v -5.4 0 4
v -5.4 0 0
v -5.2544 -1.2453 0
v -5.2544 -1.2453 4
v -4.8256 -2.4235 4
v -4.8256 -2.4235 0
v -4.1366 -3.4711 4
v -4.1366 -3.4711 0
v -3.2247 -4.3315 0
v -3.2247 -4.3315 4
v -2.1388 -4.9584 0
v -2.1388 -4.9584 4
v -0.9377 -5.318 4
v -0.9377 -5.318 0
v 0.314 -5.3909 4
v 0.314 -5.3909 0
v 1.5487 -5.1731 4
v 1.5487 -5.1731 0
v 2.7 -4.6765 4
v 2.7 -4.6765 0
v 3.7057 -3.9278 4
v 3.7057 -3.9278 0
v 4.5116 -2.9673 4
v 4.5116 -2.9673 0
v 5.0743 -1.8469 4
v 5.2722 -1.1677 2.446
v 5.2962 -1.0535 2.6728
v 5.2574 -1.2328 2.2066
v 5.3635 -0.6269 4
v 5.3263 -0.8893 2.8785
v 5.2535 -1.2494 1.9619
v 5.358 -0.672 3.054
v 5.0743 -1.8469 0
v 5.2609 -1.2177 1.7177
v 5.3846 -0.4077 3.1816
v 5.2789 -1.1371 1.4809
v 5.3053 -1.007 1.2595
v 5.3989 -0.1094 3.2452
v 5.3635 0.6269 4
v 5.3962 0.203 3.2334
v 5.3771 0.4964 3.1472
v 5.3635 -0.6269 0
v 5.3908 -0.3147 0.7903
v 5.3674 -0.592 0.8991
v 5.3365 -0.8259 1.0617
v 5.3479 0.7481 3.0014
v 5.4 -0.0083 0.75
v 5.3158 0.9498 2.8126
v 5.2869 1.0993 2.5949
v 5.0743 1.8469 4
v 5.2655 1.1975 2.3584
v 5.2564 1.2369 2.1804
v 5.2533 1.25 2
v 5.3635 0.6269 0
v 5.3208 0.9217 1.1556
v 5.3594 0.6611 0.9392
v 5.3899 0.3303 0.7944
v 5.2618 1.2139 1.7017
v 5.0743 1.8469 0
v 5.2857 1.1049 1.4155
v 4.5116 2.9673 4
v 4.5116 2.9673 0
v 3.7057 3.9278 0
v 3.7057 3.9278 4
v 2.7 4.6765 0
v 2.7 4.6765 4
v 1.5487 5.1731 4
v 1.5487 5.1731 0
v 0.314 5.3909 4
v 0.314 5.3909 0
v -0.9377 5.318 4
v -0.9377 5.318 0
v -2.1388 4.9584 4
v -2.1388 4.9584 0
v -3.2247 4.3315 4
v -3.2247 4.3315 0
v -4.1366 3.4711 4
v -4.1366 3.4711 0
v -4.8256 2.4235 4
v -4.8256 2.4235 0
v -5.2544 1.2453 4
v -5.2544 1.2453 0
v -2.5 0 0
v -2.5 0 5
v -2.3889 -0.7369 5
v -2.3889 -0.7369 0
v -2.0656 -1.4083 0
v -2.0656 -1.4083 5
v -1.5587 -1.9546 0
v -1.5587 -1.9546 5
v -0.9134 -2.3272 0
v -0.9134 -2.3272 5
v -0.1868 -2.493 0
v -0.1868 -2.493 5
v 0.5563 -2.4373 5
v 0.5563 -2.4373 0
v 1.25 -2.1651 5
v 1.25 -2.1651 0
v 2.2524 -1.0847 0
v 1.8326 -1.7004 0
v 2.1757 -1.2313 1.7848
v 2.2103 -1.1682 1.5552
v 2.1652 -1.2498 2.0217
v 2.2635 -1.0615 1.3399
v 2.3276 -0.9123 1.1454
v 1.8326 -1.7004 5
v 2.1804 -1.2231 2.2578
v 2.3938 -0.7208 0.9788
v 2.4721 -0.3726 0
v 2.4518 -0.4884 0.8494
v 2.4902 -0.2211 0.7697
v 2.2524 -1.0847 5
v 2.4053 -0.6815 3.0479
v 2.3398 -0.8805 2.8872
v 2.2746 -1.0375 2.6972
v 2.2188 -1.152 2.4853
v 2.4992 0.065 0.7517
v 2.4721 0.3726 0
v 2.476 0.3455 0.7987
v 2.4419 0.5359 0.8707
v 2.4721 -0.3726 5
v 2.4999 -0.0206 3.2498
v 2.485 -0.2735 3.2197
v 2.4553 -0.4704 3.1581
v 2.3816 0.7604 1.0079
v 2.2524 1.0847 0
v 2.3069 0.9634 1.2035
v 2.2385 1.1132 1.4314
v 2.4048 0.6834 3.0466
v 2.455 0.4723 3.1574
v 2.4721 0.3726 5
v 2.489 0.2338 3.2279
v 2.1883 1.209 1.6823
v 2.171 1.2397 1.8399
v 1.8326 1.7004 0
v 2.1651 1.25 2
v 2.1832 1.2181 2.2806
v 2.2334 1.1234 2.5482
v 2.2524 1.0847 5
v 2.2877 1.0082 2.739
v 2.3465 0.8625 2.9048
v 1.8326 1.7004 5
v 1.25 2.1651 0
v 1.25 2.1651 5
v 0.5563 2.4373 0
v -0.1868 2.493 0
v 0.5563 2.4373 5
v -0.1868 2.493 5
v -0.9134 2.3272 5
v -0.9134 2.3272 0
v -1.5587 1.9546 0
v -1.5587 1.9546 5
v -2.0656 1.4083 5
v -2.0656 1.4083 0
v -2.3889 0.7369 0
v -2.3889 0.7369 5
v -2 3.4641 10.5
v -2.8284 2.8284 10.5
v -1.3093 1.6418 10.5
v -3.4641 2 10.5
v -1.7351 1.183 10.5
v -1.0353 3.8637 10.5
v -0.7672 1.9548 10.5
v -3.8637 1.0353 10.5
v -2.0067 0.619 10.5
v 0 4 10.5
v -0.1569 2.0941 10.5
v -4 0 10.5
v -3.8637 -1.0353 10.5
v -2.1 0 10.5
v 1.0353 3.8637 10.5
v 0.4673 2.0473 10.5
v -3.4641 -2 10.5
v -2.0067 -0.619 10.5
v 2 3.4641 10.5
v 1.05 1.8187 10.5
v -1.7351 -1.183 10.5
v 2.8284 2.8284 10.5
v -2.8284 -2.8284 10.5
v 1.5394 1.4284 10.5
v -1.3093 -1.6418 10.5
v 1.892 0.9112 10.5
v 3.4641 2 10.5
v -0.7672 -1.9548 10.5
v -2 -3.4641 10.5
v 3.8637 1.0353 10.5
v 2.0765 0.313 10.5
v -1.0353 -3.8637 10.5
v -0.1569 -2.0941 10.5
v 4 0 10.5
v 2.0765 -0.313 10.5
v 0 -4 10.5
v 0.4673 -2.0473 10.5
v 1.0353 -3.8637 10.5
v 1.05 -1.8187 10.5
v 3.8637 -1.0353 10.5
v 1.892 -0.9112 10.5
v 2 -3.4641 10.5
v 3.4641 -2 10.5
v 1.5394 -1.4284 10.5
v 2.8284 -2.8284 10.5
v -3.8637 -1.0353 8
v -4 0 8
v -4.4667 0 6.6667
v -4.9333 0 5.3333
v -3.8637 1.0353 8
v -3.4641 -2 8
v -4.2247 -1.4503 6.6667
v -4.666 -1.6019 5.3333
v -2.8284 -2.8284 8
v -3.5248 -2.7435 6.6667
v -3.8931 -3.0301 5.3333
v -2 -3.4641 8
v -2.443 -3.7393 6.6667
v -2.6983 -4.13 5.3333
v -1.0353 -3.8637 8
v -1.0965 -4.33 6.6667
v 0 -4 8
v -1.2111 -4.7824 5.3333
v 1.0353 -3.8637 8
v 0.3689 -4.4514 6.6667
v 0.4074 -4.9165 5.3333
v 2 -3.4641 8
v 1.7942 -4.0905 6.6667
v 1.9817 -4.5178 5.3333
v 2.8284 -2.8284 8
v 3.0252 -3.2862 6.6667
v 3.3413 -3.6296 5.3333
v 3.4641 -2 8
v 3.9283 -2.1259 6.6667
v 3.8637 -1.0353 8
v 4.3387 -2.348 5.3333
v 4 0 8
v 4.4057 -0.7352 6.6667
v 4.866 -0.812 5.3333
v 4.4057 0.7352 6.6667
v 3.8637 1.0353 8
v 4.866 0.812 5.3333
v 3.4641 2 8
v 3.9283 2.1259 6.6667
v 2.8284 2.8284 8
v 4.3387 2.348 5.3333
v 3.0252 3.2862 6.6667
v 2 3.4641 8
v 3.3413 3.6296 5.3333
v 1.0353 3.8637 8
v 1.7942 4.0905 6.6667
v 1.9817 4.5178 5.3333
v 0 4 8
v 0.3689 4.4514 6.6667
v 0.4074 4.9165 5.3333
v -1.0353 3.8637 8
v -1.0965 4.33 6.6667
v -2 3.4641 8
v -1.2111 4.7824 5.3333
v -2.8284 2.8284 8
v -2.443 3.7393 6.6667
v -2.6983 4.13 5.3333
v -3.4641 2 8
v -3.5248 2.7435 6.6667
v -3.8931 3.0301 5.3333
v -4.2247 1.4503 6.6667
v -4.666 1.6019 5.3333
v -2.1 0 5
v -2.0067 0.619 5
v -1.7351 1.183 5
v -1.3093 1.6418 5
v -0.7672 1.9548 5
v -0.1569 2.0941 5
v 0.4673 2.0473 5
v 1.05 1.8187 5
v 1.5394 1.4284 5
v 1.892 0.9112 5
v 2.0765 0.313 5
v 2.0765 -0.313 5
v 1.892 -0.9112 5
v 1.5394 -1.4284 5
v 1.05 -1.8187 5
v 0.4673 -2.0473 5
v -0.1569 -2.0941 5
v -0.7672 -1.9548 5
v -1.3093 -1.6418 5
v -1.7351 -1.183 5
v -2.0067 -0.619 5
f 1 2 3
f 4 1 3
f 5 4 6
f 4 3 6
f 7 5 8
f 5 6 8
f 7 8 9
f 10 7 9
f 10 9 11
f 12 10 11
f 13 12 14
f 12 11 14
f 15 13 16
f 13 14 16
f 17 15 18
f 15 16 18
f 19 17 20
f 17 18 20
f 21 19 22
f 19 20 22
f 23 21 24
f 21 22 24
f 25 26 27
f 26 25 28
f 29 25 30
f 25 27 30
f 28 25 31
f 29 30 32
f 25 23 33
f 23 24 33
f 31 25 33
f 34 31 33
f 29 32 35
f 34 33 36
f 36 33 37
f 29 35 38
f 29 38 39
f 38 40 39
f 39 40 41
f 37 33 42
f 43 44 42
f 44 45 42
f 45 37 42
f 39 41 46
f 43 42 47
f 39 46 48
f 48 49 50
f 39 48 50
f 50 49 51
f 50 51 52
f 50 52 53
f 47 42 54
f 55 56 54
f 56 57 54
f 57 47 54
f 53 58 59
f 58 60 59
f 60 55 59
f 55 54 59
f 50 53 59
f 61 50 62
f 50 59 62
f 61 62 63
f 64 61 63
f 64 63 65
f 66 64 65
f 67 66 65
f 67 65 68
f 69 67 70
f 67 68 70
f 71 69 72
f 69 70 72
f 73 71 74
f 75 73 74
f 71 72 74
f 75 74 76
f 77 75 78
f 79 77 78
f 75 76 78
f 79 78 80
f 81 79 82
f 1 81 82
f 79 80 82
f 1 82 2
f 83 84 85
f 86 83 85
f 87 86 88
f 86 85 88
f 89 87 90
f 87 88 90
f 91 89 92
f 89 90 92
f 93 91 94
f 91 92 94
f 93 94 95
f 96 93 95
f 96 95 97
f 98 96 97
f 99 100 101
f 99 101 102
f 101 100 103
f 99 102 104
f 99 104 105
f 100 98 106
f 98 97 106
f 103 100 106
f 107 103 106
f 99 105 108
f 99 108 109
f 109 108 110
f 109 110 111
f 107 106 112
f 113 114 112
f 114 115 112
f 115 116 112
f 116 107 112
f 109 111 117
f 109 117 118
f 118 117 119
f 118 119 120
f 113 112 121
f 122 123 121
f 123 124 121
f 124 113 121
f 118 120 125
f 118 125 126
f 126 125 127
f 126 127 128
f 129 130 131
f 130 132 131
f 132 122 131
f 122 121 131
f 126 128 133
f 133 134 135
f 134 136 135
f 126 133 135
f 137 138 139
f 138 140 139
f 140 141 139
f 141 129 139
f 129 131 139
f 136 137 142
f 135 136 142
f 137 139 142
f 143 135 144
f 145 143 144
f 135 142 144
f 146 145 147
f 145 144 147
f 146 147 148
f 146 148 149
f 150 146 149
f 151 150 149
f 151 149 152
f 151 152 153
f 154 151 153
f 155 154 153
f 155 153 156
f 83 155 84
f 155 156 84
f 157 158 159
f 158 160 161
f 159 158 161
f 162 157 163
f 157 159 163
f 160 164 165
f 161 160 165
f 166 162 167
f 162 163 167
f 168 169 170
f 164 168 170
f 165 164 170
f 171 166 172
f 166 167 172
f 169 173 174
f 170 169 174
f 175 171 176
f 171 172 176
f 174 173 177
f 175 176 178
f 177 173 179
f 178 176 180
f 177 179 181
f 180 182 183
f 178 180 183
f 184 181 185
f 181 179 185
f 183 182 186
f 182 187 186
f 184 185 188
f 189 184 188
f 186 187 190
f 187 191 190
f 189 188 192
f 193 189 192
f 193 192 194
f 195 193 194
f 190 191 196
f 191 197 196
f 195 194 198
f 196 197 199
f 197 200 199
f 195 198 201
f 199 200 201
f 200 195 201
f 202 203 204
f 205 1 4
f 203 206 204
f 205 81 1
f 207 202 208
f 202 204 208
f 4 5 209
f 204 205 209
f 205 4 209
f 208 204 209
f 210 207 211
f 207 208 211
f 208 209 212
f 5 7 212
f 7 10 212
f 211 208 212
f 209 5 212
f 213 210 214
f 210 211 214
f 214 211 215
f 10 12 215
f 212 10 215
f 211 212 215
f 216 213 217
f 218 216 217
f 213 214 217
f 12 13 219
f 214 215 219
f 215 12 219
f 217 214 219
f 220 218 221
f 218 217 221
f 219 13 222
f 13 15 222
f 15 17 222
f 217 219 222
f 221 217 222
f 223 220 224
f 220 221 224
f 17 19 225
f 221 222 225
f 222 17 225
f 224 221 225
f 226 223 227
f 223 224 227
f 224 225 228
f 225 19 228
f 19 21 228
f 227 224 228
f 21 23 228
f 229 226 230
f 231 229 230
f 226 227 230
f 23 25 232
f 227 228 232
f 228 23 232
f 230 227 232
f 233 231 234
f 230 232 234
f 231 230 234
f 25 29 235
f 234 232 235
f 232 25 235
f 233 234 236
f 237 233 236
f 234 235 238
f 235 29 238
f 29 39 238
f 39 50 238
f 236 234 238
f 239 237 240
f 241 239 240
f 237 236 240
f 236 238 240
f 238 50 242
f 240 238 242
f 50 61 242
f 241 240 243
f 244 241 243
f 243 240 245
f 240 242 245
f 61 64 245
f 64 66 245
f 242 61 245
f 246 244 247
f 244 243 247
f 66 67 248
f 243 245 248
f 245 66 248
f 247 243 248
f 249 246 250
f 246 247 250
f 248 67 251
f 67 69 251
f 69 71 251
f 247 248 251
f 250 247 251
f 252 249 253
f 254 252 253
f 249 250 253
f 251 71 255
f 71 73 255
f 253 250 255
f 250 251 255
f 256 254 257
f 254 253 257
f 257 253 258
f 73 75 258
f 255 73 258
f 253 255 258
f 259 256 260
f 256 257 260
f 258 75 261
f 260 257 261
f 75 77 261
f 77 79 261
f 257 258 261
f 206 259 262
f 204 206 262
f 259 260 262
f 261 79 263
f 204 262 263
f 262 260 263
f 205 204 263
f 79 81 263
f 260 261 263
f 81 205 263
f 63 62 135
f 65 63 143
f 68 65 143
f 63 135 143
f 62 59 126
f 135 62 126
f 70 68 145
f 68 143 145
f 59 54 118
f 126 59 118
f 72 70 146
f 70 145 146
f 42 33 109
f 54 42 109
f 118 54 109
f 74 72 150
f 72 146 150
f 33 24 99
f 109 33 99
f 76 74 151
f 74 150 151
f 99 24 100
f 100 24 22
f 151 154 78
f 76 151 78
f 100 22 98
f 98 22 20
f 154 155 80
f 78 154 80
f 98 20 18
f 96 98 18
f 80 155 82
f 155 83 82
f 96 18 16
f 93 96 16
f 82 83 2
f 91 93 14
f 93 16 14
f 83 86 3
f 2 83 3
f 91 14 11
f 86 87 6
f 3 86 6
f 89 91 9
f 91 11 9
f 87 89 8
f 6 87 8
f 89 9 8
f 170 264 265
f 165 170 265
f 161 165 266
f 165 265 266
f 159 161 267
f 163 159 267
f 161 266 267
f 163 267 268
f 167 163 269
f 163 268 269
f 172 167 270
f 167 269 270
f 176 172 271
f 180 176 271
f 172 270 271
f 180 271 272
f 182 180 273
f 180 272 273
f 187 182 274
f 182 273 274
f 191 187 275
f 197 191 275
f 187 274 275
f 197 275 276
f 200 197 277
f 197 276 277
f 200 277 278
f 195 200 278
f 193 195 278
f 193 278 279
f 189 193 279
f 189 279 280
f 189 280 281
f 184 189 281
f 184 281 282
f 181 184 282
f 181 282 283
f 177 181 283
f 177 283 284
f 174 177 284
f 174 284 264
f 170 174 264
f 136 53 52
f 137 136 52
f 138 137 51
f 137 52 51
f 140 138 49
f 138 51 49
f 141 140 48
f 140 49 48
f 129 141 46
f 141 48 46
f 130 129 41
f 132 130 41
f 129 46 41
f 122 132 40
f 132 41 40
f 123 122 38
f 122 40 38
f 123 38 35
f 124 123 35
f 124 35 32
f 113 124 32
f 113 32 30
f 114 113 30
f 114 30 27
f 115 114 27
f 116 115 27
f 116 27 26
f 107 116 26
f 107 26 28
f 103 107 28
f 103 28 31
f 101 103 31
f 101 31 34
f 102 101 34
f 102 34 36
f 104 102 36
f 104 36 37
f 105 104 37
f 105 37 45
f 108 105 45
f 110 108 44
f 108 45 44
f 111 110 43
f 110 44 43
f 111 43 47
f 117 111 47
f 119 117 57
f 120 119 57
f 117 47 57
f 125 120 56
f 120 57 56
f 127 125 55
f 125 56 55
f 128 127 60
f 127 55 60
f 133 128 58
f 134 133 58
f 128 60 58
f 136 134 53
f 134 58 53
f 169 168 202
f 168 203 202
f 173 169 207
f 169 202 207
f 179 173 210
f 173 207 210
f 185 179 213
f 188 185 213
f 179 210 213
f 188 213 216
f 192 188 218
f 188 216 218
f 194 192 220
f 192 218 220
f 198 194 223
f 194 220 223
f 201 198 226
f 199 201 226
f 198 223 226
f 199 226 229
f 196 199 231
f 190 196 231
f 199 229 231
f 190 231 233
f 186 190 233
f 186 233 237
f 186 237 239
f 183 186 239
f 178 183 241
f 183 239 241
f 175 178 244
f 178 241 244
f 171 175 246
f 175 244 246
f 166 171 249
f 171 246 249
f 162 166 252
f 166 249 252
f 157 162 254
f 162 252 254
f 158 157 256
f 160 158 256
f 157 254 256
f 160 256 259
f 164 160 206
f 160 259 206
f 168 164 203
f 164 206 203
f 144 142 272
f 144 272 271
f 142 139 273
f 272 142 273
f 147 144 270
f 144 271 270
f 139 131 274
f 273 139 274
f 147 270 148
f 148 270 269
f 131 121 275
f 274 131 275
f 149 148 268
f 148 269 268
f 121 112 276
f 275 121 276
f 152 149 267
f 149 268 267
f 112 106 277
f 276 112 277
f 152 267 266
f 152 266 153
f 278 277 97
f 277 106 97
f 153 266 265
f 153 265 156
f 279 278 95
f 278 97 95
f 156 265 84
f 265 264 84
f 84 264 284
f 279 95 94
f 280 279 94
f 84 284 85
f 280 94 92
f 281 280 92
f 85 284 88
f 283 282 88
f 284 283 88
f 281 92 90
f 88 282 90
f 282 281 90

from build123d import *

# Parameters (mm, degrees)
CONNECTOR_M5X0_8_TAPPED_HOLE_D        = 4.2
SET_SCREW_1_M3X0_5_TAPPED_HOLE_REACH  = 16.767
SET_SCREW_1_M3X0_5_TAPPED_HOLE_BORE_R = 1.25


with BuildPart() as part:
    # Body Sketch → Body Revolve (revolve)
    with BuildSketch(Plane(origin=(0, 0, 0), x_dir=(-1, 0, 0), z_dir=(0, 1, 0))):
        Polygon((1, 10.5), (4, 10.5), (4, 8), (5.4, 4), (5.4, 0), (2.5, 0), (2.5, 5), (1, 5), align=None)
    revolve(axis=Axis((0, 0, 0), (0, 0, 1)))

    # Connector M5x0.8 Tapped Hole (through all)
    with Locations(Plane.XY.offset(10.5)):
        with Locations((0, 0)):
            Hole(CONNECTOR_M5X0_8_TAPPED_HOLE_D / 2)

    # Set Screw 1 M3x0.5 Tapped Hole bore (on position points) → Set Screw 1 M3x0.5 Tapped Hole (cut, up to next)
    with BuildSketch(Plane(origin=(5.4, 0, 2), x_dir=(0, 1, 0), z_dir=(1, 0, 0)), mode=Mode.PRIVATE) as set_screw_1_m3x0_5_tapped_hole_sk1:
        Circle(SET_SCREW_1_M3X0_5_TAPPED_HOLE_BORE_R)
    set_screw_1_m3x0_5_tapped_hole_tool1 = extrude(set_screw_1_m3x0_5_tapped_hole_sk1.sketch, amount=-SET_SCREW_1_M3X0_5_TAPPED_HOLE_REACH, mode=Mode.PRIVATE) & part.part
    add(set_screw_1_m3x0_5_tapped_hole_tool1.solids().sort_by_distance((5.4, 0, 2))[0], mode=Mode.SUBTRACT)


solid = part.part
